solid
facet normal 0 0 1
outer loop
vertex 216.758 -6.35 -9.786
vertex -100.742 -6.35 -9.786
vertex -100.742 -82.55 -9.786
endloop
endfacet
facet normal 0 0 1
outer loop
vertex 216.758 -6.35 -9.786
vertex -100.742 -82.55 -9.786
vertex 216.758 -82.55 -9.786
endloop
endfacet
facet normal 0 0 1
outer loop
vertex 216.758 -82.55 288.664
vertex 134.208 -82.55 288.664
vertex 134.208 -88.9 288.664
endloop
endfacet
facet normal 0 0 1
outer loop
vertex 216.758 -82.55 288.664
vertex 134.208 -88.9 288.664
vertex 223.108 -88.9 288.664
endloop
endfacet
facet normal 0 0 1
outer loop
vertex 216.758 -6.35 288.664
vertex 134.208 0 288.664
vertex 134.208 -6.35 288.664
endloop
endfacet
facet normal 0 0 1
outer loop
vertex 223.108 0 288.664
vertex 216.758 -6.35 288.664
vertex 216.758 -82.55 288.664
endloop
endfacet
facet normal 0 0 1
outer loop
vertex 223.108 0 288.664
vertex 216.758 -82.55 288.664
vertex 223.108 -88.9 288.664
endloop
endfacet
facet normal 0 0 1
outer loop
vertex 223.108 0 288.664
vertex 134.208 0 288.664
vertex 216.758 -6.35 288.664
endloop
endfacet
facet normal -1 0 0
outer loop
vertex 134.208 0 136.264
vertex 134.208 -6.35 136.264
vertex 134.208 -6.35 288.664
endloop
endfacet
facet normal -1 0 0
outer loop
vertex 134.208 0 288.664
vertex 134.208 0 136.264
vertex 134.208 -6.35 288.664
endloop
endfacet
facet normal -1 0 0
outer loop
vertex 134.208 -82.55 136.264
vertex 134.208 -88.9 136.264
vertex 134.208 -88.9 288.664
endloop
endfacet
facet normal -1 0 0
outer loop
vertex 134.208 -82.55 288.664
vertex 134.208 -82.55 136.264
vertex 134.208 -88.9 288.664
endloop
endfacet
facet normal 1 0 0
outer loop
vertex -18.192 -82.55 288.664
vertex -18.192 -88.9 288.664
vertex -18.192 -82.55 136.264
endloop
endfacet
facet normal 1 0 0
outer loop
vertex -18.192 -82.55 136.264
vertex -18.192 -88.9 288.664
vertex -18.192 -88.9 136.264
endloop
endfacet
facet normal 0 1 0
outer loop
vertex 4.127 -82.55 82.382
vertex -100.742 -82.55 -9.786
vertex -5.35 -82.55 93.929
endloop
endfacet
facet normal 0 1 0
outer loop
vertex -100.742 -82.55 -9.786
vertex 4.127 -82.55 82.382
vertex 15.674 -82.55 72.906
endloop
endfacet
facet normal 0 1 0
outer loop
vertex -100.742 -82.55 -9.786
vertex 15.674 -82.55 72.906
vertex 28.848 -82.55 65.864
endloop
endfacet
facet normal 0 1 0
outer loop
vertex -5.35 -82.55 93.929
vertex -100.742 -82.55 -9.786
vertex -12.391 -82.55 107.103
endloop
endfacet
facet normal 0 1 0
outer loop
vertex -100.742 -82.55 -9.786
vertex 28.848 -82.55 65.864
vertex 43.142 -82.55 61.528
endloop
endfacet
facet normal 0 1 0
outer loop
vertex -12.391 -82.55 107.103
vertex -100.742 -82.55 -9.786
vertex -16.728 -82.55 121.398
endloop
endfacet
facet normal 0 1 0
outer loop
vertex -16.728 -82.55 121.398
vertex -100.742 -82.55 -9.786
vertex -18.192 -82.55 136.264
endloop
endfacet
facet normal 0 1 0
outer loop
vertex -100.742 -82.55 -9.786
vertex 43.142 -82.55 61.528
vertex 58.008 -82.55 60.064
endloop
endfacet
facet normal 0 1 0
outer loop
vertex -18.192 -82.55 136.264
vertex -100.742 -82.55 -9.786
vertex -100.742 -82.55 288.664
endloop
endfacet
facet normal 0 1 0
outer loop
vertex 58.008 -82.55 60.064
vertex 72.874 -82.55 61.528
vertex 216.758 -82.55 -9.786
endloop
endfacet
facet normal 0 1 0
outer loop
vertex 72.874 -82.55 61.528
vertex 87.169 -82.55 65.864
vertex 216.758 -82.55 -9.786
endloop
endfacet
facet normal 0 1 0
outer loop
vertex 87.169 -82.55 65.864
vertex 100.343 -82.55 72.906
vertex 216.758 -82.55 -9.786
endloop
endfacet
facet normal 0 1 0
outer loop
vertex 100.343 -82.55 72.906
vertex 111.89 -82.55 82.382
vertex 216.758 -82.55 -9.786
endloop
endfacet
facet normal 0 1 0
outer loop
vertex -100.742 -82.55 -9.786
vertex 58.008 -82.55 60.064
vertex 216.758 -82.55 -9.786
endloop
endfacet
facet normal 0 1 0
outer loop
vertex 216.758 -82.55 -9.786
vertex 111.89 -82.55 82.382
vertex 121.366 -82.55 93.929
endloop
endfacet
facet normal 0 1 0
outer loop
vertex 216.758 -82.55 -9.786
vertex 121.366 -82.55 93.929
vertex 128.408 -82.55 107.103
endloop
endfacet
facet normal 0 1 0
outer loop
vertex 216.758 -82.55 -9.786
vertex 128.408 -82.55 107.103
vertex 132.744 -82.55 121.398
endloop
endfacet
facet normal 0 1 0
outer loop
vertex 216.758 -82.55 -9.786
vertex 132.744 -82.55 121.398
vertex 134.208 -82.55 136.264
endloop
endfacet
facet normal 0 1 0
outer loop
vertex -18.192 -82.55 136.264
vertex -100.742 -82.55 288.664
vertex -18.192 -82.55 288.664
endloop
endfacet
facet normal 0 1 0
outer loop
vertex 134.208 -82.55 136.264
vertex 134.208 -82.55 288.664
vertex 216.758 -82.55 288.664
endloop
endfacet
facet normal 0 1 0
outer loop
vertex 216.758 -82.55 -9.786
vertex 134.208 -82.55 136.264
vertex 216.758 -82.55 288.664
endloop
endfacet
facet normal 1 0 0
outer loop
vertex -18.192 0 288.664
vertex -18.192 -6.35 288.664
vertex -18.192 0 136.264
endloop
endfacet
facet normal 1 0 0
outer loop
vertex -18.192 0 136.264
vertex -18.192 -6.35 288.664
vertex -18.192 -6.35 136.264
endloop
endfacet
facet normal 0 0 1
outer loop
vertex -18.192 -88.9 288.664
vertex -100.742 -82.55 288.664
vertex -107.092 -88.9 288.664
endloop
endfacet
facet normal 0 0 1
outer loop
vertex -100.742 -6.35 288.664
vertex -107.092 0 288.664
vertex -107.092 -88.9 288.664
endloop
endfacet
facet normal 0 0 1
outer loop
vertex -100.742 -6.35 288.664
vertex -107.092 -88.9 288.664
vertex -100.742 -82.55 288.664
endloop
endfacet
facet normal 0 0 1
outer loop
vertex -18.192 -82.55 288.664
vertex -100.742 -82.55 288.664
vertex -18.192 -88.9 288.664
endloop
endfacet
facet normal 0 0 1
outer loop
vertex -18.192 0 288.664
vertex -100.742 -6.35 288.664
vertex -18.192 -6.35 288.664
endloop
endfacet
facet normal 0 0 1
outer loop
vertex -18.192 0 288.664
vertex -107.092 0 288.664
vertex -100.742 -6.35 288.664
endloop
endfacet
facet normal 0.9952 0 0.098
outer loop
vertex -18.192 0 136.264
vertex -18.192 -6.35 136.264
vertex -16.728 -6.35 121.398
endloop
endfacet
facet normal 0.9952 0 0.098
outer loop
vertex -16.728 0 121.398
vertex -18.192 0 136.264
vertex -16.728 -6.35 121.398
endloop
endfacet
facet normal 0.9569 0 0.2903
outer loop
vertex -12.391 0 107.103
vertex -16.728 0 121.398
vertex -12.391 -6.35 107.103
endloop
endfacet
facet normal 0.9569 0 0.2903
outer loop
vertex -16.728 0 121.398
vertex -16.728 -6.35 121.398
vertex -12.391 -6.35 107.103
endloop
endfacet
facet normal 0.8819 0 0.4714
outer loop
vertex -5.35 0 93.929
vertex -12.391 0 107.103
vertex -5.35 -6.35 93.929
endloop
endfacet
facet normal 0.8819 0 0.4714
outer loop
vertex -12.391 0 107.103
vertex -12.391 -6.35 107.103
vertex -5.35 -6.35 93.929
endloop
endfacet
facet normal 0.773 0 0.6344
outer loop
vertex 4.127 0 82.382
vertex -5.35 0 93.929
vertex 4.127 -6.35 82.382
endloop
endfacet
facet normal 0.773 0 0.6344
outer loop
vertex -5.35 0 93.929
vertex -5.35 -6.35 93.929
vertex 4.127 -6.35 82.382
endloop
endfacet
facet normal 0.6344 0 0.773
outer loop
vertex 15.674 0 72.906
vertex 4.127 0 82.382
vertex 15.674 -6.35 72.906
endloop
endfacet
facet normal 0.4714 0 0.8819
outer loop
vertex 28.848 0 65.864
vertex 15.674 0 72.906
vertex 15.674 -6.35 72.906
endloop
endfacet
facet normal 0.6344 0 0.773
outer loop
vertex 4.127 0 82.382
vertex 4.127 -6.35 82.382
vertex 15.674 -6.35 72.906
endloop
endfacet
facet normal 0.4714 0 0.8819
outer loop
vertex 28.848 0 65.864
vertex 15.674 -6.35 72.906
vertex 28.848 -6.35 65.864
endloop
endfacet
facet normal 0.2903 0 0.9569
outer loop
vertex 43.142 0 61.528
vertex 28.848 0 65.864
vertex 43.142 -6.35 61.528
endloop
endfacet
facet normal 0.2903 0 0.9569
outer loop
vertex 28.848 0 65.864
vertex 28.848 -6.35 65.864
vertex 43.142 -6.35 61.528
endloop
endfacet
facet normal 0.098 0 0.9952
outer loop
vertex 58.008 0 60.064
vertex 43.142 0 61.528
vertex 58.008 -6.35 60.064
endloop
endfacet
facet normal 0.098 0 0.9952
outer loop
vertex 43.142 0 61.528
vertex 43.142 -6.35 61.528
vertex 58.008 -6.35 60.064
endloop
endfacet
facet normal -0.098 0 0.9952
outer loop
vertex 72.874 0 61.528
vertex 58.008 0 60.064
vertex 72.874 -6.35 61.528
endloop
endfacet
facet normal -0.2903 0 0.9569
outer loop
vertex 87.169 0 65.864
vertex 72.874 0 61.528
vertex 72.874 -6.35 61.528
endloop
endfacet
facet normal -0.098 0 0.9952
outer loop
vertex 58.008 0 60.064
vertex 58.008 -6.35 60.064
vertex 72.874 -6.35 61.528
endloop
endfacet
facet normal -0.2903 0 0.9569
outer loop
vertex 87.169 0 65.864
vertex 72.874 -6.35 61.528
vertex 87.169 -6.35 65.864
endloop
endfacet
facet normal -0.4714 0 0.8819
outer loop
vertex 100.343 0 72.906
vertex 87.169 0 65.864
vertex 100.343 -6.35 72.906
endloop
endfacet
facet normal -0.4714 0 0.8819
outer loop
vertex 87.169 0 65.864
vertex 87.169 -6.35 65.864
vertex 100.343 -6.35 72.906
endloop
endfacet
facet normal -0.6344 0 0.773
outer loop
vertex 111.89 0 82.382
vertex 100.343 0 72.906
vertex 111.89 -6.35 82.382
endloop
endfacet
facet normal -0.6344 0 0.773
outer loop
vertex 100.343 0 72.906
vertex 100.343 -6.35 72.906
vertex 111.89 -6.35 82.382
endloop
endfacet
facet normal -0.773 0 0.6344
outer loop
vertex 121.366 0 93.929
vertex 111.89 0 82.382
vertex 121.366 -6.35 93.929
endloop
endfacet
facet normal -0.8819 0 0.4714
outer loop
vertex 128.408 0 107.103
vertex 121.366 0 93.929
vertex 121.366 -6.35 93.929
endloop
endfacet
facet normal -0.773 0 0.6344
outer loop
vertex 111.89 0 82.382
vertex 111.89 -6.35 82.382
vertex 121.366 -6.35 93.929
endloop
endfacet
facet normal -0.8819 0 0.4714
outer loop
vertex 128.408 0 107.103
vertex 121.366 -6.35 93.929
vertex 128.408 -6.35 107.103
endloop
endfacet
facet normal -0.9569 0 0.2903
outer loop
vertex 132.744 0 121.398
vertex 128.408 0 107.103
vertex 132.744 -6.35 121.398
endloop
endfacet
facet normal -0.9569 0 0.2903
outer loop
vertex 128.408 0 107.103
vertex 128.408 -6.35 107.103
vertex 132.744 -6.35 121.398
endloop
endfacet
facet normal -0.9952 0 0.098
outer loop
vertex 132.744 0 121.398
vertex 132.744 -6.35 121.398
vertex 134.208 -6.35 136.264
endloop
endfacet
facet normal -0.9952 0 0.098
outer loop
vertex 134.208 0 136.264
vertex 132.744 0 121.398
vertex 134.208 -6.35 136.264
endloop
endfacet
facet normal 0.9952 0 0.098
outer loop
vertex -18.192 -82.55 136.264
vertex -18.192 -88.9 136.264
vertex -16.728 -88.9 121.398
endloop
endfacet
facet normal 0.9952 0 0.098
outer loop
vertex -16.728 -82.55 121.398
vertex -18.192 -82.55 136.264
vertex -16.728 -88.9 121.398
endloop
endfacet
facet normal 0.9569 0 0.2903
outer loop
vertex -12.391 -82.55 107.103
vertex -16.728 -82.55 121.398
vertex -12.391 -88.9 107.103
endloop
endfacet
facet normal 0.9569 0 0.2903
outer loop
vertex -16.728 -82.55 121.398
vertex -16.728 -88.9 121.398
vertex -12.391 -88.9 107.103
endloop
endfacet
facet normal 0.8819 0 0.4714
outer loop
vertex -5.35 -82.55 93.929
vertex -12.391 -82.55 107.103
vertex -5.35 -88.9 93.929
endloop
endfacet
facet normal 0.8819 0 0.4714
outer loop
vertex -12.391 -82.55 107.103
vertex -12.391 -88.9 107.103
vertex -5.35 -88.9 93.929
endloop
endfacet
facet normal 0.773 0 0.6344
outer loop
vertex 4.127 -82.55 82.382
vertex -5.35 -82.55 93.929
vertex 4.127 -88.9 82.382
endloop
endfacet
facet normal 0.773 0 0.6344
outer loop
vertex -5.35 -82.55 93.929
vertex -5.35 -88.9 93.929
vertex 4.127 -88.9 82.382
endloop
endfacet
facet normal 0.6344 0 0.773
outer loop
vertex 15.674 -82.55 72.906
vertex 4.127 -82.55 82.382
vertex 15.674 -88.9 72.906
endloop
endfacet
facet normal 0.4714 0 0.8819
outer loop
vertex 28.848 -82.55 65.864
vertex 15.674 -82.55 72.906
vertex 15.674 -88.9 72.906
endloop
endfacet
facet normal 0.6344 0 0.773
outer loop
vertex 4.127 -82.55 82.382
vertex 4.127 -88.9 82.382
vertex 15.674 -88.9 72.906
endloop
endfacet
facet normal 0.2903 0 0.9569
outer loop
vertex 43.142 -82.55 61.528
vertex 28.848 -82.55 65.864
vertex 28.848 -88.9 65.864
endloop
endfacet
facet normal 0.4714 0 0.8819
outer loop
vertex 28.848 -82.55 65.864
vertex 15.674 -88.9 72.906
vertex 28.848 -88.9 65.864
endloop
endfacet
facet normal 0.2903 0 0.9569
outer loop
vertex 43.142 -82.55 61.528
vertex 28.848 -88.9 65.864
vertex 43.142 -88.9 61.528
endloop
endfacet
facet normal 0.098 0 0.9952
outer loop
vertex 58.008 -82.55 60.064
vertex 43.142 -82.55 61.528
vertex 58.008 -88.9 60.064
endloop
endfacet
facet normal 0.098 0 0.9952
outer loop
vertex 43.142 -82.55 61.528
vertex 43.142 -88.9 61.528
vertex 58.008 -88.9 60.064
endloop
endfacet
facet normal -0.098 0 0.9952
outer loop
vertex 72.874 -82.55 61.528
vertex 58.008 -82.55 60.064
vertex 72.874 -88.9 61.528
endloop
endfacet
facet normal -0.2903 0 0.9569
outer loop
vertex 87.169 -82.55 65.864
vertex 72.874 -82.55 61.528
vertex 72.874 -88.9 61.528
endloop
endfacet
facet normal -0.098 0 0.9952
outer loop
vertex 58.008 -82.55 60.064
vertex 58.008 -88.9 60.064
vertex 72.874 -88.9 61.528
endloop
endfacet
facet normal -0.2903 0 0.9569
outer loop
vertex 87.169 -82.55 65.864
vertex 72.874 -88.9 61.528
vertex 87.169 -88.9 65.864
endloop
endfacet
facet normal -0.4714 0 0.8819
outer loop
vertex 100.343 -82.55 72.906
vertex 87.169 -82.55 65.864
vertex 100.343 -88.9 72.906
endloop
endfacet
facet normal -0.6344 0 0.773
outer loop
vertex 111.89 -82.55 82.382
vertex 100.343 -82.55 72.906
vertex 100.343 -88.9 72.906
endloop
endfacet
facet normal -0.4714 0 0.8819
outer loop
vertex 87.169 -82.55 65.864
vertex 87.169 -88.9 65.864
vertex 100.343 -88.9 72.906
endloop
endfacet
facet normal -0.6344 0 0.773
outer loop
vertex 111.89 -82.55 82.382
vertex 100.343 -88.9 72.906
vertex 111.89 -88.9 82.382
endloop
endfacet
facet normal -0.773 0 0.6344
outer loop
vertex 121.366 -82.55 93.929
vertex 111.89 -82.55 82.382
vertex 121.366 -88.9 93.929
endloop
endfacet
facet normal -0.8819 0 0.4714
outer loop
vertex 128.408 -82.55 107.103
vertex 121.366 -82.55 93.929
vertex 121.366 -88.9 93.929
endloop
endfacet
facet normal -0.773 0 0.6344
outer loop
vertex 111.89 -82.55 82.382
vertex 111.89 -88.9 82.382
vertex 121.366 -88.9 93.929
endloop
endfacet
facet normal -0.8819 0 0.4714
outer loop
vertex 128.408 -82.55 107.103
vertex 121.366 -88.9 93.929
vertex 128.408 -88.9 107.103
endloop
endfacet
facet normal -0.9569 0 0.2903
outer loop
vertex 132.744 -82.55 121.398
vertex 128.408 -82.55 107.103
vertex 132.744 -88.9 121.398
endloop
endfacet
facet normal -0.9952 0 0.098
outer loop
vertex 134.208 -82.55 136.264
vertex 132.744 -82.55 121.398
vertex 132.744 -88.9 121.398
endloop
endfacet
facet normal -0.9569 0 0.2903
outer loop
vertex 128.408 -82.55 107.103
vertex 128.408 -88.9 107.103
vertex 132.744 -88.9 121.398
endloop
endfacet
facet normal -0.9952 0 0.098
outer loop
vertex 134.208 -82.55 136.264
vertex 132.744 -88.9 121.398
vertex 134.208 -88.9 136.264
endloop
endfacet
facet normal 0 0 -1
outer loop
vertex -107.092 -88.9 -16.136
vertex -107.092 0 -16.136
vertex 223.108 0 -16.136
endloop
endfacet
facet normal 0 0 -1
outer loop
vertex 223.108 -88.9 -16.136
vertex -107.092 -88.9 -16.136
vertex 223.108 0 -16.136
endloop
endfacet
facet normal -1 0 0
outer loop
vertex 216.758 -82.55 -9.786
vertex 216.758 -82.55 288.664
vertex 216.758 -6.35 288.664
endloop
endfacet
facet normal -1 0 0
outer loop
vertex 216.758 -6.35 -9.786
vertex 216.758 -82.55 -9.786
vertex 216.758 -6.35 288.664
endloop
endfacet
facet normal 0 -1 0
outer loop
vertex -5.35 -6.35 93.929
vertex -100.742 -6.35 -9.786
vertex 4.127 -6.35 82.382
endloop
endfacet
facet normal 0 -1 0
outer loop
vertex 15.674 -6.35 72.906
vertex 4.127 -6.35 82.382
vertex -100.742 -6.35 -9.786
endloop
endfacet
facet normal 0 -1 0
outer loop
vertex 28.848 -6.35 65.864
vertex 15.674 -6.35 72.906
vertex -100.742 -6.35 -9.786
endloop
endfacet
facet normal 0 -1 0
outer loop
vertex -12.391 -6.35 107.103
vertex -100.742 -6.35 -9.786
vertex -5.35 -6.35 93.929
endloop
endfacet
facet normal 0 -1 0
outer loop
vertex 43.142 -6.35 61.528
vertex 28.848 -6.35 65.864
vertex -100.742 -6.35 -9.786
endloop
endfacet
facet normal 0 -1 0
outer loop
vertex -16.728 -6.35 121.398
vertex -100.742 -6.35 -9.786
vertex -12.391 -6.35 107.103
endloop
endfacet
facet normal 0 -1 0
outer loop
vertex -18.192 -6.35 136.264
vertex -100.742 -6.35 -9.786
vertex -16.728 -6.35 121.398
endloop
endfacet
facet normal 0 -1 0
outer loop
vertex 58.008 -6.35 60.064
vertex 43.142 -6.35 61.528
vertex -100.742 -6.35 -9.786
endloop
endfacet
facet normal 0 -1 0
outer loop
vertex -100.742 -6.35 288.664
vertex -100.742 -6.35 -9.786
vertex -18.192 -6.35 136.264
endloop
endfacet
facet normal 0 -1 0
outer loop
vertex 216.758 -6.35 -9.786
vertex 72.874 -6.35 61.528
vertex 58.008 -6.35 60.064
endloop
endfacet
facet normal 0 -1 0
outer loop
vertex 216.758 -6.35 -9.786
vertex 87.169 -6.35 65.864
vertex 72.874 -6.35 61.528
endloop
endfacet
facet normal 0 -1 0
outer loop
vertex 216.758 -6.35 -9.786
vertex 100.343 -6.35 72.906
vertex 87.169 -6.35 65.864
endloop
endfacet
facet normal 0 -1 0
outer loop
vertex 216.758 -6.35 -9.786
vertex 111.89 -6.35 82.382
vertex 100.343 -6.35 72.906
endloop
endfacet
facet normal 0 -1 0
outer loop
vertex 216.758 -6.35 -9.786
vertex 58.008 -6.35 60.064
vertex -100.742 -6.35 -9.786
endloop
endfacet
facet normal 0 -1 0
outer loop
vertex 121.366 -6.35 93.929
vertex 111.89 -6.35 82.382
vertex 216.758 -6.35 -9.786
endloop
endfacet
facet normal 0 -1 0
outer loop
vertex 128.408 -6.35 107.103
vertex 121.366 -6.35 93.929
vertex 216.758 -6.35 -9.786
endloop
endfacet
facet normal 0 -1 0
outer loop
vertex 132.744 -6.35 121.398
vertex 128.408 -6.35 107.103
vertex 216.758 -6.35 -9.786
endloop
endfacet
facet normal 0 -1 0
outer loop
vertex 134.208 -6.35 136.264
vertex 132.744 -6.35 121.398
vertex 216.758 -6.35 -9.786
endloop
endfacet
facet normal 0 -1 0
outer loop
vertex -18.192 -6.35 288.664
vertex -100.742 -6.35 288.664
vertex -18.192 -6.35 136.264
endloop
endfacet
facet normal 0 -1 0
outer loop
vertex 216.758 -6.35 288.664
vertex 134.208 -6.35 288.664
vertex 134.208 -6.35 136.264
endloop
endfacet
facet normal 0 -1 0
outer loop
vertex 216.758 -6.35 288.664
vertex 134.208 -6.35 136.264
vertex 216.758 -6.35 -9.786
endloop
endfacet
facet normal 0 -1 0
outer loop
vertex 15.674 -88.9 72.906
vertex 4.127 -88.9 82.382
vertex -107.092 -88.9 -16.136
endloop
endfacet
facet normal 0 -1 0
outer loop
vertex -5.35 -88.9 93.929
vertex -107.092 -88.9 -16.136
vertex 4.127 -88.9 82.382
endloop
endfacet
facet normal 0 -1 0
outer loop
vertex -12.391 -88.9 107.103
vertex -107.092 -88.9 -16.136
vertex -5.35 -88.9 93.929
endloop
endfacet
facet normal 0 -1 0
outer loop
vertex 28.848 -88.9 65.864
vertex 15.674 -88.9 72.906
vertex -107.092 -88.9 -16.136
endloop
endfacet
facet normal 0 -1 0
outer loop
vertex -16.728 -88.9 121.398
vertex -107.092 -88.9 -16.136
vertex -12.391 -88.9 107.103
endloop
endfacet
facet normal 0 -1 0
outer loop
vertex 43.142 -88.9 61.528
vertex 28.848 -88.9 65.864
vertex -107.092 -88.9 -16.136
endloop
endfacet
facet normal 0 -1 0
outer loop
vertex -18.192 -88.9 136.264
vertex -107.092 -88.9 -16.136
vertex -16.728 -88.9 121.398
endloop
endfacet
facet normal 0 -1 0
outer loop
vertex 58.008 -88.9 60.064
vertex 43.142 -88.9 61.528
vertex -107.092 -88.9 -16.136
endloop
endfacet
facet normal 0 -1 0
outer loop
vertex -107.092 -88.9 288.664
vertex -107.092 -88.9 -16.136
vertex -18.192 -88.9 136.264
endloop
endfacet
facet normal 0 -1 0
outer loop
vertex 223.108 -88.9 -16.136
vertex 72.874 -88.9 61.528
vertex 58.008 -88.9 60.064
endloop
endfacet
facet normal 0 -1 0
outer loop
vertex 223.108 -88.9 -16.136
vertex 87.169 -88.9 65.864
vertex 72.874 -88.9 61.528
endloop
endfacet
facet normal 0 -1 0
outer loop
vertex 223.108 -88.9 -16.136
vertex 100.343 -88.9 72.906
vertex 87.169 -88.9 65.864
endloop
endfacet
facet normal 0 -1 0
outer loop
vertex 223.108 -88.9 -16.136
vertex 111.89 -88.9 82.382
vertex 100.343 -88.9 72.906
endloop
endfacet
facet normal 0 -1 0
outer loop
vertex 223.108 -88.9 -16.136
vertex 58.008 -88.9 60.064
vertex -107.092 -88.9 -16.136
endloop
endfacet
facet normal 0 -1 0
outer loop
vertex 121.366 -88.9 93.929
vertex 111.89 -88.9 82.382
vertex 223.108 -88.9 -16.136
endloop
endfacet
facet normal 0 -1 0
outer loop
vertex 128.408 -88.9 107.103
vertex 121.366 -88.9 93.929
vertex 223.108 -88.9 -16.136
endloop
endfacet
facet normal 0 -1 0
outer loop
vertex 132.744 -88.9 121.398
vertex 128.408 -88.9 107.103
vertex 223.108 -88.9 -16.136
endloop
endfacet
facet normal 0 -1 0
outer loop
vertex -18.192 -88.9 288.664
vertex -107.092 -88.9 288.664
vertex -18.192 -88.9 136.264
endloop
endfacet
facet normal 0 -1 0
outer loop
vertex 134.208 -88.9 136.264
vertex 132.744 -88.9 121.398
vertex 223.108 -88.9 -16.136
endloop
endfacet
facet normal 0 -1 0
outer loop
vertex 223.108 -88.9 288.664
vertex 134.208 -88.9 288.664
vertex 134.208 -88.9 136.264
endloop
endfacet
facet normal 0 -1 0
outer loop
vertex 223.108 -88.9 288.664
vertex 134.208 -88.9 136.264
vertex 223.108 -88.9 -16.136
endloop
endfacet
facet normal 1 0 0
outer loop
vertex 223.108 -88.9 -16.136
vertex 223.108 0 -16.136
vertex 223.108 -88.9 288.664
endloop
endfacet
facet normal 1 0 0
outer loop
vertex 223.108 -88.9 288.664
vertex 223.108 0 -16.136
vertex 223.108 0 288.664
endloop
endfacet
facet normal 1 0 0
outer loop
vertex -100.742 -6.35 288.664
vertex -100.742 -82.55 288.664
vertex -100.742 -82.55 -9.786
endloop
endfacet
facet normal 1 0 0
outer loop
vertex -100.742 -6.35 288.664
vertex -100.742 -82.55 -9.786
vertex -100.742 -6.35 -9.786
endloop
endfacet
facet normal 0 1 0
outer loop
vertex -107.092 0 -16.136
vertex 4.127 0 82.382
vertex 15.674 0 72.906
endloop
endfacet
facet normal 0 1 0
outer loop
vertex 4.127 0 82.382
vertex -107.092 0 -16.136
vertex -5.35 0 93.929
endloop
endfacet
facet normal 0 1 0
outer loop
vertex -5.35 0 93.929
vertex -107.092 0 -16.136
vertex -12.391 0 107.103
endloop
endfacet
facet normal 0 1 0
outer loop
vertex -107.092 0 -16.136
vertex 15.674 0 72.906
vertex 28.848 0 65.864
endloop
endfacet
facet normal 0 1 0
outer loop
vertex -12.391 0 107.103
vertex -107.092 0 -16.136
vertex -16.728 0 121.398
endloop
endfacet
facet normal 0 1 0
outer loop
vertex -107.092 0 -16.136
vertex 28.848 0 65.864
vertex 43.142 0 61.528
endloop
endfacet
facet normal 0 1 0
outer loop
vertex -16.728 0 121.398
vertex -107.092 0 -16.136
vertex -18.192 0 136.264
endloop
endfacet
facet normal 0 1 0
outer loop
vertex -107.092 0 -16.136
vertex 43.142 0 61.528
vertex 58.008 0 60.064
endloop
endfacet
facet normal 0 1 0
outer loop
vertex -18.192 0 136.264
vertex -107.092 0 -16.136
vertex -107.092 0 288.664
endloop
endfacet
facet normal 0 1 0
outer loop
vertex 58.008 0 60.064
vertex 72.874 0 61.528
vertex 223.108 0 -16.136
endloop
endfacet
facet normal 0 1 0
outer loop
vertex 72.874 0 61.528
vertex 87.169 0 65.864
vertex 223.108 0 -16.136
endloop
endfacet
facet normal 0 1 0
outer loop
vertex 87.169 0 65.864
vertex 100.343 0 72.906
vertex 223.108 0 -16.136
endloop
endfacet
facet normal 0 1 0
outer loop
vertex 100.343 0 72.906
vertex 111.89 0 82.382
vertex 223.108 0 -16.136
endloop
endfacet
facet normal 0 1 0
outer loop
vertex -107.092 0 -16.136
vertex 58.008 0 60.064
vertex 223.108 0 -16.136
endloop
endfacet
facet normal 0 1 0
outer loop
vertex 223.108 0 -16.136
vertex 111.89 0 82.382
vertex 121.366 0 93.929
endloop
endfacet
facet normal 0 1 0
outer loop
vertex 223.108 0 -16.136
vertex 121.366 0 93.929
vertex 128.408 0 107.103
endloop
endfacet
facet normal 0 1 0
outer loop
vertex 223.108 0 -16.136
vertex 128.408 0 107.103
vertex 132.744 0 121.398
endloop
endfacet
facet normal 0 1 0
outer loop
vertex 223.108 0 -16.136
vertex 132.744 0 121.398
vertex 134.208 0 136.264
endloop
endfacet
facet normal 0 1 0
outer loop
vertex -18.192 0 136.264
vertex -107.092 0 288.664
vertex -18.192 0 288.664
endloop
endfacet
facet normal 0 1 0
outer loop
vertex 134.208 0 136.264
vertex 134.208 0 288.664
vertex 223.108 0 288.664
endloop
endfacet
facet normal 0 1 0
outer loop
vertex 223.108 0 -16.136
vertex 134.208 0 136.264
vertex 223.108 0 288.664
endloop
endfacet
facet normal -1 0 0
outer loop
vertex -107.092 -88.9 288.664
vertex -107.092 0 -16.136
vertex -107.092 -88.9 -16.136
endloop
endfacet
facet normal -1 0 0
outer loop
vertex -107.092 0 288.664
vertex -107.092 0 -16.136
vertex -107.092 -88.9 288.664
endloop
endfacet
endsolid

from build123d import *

# Parameters (mm, degrees)
F0_W     = 330.2
F0_H     = 304.8
F1_DEPTH = 88.9
F2_W     = 317.5
F2_H     = 76.2
F3_DEPTH = 298.45
F5_DEPTH = 127


with BuildPart() as f1:
    # F0 (on Front) → F1 (new body)
    with BuildSketch(Plane.XZ):
        with Locations((58.008134, 136.263882)):
            Rectangle(F0_W, F0_H)
    extrude(amount=F1_DEPTH)

    # F2 (on face) → F3 (cut)
    with BuildSketch(Plane.XY.offset(288.663882)):
        with Locations((58.008134, -44.45)):
            Rectangle(F2_W, F2_H)
    extrude(amount=-F3_DEPTH, mode=Mode.SUBTRACT)

    # F4 (on face) → F5 (cut)
    with BuildSketch(Plane.XZ.offset(88.9)):
        with BuildLine():
            Line((-18.191866, 288.663882), (-18.191866, 136.263882))
            ThreePointArc((-18.191866, 136.263882), (58.008134, 60.063882), (134.208134, 136.263882))
            Line((134.208134, 136.263882), (134.208134, 288.663882))
            Line((134.208134, 288.663882), (-18.191866, 288.663882))
        make_face()
    extrude(amount=-F5_DEPTH, mode=Mode.SUBTRACT)


solid = f1.part
